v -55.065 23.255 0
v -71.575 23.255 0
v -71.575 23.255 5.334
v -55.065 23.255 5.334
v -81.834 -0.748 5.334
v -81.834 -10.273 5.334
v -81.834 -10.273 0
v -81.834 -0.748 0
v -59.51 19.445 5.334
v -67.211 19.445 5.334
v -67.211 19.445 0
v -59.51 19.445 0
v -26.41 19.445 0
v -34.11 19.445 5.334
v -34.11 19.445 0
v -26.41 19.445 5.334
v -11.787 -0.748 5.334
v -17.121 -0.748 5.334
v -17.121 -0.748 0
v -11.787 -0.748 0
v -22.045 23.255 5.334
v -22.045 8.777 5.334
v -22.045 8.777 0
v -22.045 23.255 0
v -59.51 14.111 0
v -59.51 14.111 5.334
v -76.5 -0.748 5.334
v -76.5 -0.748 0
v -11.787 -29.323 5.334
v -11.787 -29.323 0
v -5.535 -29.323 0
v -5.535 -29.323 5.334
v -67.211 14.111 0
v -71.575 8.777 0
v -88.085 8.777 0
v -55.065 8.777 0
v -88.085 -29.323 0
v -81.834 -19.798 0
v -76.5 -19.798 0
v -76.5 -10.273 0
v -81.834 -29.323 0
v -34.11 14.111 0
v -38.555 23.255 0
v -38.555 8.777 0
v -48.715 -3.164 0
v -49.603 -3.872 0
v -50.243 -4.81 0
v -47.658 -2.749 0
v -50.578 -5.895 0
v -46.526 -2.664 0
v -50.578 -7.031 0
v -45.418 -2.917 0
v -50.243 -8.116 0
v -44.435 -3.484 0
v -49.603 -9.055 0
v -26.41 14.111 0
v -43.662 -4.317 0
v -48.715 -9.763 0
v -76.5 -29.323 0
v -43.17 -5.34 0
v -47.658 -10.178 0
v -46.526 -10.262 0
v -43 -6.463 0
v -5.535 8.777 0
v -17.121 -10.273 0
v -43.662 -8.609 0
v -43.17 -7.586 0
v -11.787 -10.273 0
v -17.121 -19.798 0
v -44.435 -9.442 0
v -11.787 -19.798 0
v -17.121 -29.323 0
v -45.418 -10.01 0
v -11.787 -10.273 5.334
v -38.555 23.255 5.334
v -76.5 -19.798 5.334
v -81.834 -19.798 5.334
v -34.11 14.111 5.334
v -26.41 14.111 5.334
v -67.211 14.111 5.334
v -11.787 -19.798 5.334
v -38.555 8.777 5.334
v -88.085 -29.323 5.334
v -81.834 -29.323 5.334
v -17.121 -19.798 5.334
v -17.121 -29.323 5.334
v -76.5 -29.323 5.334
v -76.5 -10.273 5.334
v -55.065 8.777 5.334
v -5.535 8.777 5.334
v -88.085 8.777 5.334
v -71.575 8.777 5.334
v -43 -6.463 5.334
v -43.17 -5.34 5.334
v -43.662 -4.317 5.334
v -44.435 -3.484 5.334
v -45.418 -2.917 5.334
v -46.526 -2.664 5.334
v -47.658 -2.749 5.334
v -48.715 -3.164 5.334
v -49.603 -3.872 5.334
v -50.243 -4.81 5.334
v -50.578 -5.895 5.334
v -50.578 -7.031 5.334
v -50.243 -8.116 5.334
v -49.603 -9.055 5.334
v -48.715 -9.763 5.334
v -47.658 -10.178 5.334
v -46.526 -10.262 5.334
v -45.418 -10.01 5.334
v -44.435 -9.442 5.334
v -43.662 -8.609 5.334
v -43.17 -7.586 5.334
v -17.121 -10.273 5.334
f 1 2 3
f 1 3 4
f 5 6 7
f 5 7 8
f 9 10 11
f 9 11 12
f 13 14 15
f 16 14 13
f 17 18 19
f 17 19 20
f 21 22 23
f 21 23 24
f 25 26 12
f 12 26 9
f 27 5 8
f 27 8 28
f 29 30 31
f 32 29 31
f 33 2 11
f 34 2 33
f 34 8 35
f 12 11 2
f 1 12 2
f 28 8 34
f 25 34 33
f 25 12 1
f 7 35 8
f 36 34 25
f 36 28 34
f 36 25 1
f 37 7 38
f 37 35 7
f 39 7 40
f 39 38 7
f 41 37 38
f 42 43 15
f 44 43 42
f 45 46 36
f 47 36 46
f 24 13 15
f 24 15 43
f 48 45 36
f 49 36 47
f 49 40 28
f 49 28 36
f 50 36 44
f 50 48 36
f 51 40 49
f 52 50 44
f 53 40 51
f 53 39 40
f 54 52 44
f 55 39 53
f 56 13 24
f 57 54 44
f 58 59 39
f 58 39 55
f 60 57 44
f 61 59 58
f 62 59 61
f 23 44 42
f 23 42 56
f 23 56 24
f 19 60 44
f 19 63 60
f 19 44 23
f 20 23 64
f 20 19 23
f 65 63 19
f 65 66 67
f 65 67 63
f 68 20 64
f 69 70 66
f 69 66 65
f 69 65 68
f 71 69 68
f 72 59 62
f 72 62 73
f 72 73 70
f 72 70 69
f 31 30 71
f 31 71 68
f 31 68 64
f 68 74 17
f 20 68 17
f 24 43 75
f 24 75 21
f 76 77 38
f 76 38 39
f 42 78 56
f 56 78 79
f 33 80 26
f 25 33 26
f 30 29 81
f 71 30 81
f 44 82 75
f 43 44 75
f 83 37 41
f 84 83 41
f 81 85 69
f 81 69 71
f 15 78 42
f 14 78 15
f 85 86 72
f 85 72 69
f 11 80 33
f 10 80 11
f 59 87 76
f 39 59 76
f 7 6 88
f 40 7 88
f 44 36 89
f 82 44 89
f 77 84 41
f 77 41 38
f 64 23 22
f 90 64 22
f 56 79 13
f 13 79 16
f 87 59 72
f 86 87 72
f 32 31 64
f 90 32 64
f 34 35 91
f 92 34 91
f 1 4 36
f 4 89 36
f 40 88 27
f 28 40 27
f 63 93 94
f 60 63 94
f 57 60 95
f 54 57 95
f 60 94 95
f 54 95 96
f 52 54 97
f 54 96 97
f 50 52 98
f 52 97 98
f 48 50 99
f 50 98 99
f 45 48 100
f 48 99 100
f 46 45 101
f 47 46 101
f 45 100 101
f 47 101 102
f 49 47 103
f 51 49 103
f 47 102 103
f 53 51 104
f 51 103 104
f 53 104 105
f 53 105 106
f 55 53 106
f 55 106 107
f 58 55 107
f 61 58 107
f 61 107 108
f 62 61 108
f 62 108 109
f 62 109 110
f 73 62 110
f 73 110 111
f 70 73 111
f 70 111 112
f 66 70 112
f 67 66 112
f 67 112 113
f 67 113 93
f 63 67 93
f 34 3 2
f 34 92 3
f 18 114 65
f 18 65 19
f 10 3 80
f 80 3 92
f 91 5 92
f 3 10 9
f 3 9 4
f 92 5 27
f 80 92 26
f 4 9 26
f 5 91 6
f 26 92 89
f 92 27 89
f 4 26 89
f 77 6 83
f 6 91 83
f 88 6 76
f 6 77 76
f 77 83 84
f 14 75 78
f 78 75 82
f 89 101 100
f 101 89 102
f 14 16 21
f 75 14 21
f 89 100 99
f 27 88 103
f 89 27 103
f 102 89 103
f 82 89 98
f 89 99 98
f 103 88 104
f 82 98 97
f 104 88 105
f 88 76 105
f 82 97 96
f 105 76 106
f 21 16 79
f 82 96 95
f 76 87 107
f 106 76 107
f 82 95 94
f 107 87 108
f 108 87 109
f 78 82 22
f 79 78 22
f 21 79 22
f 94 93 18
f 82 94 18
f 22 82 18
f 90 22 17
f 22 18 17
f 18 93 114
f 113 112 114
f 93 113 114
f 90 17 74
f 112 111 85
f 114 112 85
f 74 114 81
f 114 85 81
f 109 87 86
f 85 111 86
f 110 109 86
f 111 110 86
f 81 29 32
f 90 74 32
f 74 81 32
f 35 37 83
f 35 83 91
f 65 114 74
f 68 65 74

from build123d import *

# Parameters (mm, degrees)
SKETCH1_W                = 82.55
SKETCH1_H                = 43.434
BOSS_EXTRUDE1_DEPTH      = 5.334
CUT_EXTRUDE1_START       = -88.085249325
CUT_EXTRUDE1_OUTLINE_W   = 5.334
CUT_EXTRUDE1_OUTLINE_H   = 5.334
CUT_EXTRUDE1_DEPTH       = 16.51
CUT_EXTRUDE1_START_2     = -55.065249325
CUT_EXTRUDE1_2_OUTLINE_W = 5.334
CUT_EXTRUDE1_2_OUTLINE_H = 5.334
CUT_EXTRUDE1_2_DEPTH     = 16.51
CUT_EXTRUDE1_START_3     = -22.045249325
CUT_EXTRUDE1_3_OUTLINE_W = 5.334
CUT_EXTRUDE1_3_OUTLINE_H = 5.334
CUT_EXTRUDE1_3_DEPTH     = 16.51
SKETCH3_W                = 5.334
SKETCH3_H                = 9.525
CUT_EXTRUDE2_DEPTH       = 93.990910348
SKETCH4_R                = 3.81
CUT_EXTRUDE3_DEPTH       = 93.990910348
SKETCH5_W                = 16.51
SKETCH5_H                = 5.334
BOSS_EXTRUDE2_DEPTH      = 9.144
SKETCH6_W                = 7.700463705
SKETCH6_H                = 5.334
SKETCH6_W_2              = 7.700463706
CUT_EXTRUDE4_DEPTH       = 93.990910348


# Read off the part's stored shape, not the designer's step: Cut-Extrude1
with BuildPart() as part:
    # Sketch1 → Boss-Extrude1 (new body)
    with BuildSketch(Plane.XY):
        with Locations((-46.810249325, -7.606142782)):
            Rectangle(SKETCH1_W, SKETCH1_H)
    extrude(amount=BOSS_EXTRUDE1_DEPTH)

    # Cut-Extrude1 outline → Cut-Extrude1 (cut)
    with BuildSketch(Plane.YZ.offset(CUT_EXTRUDE1_START)):
        with Locations((11.443857218, 2.667)):
            Rectangle(CUT_EXTRUDE1_OUTLINE_W, CUT_EXTRUDE1_OUTLINE_H)
    extrude(amount=CUT_EXTRUDE1_DEPTH, mode=Mode.SUBTRACT)

    # Cut-Extrude1 2 outline → Cut-Extrude1 2 (cut)
    with BuildSketch(Plane.YZ.offset(CUT_EXTRUDE1_START_2)):
        with Locations((11.443857218, 2.667)):
            Rectangle(CUT_EXTRUDE1_2_OUTLINE_W, CUT_EXTRUDE1_2_OUTLINE_H)
    extrude(amount=CUT_EXTRUDE1_2_DEPTH, mode=Mode.SUBTRACT)

    # Cut-Extrude1 3 outline → Cut-Extrude1 3 (cut)
    with BuildSketch(Plane.YZ.offset(CUT_EXTRUDE1_START_3)):
        with Locations((11.443857218, 2.667)):
            Rectangle(CUT_EXTRUDE1_3_OUTLINE_W, CUT_EXTRUDE1_3_OUTLINE_H)
    extrude(amount=CUT_EXTRUDE1_3_DEPTH, mode=Mode.SUBTRACT)

    # Sketch3 → Cut-Extrude2 (cut, through all)
    with BuildSketch(Plane.XY.offset(5.334)):
        with Locations((-79.166667411, -24.560642782)):
            Rectangle(SKETCH3_W, SKETCH3_H)
        with Locations((-79.166667411, -5.510642782)):
            Rectangle(SKETCH3_W, SKETCH3_H)
        with Locations((-14.453831238, -5.510642782)):
            Rectangle(SKETCH3_W, SKETCH3_H)
        with Locations((-14.453831238, -24.560642782)):
            Rectangle(SKETCH3_W, SKETCH3_H)
    extrude(amount=-CUT_EXTRUDE2_DEPTH, mode=Mode.SUBTRACT)

    # Sketch4 → Cut-Extrude3 (cut, through all)
    with BuildSketch(Plane.XY.offset(5.334)):
        with Locations((-46.810249325, -6.463142782)):
            Circle(SKETCH4_R)
    extrude(amount=-CUT_EXTRUDE3_DEPTH, mode=Mode.SUBTRACT)

    # Sketch5 → Boss-Extrude2 (add)
    with BuildSketch(Plane(origin=(0, 14.110857218, 0), x_dir=(1, 0, 0), z_dir=(0, 1, 0))):
        with Locations((-63.320249325, -2.667)):
            Rectangle(SKETCH5_W, SKETCH5_H)
        with Locations((-30.300249325, -2.667)):
            Rectangle(SKETCH5_W, SKETCH5_H)
    extrude(amount=BOSS_EXTRUDE2_DEPTH)

    # Sketch6 → Cut-Extrude4 (cut, through all)
    with BuildSketch(Plane.XY.offset(5.334)):
        with Locations((-63.360481178, 16.777857218)):
            Rectangle(SKETCH6_W, SKETCH6_H)
        with Locations((-30.260017472, 16.777857218)):
            Rectangle(SKETCH6_W_2, SKETCH6_H)
    extrude(amount=-CUT_EXTRUDE4_DEPTH, mode=Mode.SUBTRACT)


solid = part.part
